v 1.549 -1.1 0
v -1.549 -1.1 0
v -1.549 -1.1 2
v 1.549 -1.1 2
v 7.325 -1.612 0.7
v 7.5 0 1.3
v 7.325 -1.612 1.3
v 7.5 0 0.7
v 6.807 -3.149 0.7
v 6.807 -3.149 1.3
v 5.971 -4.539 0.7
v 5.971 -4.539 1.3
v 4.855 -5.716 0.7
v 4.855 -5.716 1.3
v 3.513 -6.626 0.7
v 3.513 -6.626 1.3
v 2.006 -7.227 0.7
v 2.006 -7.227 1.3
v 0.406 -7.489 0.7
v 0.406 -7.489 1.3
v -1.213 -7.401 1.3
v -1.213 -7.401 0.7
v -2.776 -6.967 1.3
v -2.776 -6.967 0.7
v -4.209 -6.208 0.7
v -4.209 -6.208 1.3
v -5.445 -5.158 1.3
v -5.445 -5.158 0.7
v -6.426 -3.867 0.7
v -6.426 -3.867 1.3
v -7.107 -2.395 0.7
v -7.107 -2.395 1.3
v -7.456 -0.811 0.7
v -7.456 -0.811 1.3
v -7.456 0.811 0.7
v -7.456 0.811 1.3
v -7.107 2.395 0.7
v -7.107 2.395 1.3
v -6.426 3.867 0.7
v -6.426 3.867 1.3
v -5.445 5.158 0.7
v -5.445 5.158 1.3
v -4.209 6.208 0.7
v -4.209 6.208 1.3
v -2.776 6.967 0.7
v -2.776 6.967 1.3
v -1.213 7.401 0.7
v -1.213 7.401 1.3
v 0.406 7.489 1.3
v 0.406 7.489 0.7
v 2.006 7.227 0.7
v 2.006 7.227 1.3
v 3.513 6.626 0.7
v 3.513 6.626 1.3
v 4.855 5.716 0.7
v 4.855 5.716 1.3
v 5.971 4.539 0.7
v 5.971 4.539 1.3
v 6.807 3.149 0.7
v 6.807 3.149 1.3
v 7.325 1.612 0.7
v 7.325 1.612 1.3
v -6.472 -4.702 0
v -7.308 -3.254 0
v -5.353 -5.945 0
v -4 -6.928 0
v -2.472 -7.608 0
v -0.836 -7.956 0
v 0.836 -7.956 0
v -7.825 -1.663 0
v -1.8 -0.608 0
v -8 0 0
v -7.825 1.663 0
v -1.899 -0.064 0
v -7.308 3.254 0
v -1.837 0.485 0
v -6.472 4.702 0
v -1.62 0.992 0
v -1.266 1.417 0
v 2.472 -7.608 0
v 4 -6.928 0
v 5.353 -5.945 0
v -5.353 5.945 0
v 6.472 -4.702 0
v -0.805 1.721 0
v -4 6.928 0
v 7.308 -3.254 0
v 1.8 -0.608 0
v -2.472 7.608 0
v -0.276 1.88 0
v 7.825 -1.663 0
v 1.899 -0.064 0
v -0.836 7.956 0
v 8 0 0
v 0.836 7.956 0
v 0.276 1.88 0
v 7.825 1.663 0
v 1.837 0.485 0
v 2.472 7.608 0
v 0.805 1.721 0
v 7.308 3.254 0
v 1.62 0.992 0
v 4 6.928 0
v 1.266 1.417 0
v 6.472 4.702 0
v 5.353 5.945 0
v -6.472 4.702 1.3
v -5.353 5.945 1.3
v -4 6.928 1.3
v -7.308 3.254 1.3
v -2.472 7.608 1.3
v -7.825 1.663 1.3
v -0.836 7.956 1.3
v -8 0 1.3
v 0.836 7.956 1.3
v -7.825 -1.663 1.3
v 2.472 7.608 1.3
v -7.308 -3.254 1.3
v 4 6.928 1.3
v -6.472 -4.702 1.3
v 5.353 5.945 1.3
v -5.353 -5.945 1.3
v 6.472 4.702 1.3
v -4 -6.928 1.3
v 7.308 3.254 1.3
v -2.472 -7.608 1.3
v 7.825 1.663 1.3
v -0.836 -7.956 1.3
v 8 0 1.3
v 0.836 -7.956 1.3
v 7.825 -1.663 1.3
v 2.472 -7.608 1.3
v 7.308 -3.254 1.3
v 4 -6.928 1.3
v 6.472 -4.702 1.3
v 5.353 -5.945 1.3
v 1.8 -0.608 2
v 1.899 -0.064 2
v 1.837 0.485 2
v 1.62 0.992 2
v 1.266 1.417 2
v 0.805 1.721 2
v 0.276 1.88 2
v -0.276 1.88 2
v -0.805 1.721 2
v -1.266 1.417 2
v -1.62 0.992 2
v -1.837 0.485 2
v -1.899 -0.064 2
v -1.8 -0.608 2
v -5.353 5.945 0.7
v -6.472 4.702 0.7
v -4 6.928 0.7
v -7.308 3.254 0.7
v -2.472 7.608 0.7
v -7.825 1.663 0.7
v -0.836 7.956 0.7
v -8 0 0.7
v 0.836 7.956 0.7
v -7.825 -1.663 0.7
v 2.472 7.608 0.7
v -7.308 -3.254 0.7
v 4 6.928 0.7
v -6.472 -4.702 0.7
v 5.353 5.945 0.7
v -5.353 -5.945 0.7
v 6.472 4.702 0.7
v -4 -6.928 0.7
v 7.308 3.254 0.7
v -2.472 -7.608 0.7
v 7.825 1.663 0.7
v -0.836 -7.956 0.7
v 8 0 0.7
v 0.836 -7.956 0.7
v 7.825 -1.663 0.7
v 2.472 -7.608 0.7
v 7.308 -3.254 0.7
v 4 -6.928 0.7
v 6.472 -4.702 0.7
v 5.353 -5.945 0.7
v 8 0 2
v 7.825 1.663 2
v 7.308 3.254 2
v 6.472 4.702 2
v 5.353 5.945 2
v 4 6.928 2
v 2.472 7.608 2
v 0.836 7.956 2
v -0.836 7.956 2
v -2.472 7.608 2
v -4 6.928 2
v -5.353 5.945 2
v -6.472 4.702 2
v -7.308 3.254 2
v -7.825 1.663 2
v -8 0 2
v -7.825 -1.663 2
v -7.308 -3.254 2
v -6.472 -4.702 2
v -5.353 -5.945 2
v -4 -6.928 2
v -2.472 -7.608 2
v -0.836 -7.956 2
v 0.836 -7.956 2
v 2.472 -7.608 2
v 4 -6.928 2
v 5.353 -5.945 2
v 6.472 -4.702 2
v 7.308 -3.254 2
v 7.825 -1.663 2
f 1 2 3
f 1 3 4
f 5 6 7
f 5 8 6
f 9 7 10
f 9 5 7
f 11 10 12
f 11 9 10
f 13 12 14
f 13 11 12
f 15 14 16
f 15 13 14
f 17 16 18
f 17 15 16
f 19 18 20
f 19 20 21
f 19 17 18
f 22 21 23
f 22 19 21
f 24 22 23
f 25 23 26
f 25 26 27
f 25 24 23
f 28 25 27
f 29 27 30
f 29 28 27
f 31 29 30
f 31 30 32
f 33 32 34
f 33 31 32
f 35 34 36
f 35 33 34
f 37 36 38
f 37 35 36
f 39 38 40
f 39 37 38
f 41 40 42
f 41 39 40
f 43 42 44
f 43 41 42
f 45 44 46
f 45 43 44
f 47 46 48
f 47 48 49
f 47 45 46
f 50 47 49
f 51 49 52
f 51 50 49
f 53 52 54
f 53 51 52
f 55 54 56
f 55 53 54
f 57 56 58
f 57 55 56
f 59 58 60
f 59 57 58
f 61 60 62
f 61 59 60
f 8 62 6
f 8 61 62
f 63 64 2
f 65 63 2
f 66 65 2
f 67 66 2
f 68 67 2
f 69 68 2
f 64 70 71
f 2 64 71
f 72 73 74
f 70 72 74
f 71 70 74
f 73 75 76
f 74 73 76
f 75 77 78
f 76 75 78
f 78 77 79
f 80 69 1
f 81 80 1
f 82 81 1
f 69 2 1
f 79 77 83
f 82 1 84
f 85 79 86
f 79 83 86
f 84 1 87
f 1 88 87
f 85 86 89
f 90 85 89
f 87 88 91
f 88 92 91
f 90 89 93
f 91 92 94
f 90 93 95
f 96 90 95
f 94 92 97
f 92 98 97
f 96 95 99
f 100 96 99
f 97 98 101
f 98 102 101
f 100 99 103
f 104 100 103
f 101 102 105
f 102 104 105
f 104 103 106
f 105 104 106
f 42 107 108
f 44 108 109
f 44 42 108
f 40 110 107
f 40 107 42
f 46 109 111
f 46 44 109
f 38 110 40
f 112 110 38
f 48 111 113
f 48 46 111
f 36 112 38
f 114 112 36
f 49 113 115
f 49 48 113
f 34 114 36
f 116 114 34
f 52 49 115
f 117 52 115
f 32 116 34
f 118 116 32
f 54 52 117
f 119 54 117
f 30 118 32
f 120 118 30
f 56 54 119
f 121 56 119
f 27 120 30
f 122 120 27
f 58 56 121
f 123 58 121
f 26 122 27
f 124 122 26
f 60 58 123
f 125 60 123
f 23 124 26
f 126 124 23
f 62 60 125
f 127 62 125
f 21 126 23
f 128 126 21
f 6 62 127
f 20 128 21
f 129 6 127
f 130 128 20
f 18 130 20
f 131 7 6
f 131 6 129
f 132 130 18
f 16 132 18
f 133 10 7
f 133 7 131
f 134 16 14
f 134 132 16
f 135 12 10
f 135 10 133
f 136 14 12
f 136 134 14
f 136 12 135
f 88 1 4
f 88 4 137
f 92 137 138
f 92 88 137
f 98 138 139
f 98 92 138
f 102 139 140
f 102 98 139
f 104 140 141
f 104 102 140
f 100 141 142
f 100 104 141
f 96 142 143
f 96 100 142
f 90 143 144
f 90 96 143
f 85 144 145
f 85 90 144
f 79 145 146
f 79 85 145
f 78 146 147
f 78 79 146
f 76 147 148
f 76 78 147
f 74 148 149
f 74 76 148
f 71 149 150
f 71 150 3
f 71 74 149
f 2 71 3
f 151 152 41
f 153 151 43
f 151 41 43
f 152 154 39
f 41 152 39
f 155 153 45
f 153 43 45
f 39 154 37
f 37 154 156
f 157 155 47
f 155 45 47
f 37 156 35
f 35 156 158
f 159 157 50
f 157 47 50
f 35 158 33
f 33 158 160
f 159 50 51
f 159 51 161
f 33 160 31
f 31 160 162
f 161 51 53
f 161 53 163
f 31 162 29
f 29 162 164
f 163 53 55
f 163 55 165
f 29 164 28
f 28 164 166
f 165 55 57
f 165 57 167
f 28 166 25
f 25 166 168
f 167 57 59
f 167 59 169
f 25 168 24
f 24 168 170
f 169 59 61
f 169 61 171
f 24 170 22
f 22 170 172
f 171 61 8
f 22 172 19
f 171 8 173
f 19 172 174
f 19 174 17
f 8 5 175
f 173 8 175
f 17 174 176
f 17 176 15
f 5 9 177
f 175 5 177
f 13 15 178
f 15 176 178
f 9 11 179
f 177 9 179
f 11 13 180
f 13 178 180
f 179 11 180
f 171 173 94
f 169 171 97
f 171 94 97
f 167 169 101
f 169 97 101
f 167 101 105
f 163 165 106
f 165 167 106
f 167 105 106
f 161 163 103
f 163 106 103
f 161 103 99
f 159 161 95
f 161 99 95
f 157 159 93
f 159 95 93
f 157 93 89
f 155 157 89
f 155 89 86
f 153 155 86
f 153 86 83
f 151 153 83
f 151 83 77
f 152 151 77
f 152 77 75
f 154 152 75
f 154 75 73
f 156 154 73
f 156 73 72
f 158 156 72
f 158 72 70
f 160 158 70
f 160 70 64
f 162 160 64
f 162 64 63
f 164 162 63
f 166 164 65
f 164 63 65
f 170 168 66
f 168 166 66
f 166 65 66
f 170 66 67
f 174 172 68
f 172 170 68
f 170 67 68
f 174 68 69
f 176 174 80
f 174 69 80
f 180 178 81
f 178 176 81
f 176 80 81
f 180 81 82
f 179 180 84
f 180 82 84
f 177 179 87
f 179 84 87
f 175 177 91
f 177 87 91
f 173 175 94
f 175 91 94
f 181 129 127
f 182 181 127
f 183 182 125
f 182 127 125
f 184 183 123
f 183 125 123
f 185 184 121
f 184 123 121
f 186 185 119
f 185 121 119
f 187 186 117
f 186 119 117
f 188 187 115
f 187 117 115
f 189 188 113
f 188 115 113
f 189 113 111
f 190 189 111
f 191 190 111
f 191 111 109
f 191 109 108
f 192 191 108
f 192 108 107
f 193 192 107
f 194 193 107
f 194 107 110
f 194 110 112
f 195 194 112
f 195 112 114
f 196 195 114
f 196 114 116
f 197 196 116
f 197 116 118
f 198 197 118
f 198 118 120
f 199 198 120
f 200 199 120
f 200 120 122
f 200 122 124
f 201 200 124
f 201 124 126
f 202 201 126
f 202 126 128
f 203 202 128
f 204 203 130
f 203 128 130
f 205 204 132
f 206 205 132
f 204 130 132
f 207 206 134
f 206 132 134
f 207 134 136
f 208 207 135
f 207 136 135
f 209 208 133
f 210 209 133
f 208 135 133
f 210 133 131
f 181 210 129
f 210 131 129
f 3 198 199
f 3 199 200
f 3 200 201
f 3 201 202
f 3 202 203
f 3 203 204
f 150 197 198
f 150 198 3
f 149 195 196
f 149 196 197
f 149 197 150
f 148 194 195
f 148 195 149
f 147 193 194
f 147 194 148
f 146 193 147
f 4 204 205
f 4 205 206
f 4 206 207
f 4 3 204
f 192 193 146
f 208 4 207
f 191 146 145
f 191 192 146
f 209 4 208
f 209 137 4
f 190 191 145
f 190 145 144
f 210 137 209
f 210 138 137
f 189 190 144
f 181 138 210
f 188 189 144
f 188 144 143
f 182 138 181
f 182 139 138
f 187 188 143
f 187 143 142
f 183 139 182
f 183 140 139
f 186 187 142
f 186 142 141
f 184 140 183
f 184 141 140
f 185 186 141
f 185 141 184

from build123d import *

# Parameters (mm, degrees)
SKETCH1_R           = 8
BOSS_EXTRUDE2_DEPTH = 2
SKETCH2_W           = 0.5
SKETCH2_H           = 0.6


with BuildPart() as part:
    # Sketch1 → Boss-Extrude2 (new body)
    with BuildSketch(Plane.XY):
        Circle(SKETCH1_R)
        with BuildLine():
            Line((-1.549193338, -1.1), (1.549193338, -1.1))
            ThreePointArc((1.549193338, -1.1), (0, 1.9), (-1.549193338, -1.1))
        make_face(mode=Mode.SUBTRACT)
    extrude(amount=BOSS_EXTRUDE2_DEPTH)

    # Sketch2 → Cut-Revolve1 (revolve, cut)
    with BuildSketch(Plane(origin=(0, 0, 0), x_dir=(1, 0, 0), z_dir=(0, 1, 0)), mode=Mode.PRIVATE) as cut_revolve1_sk:
        with Locations((-7.75, -1)):
            Rectangle(SKETCH2_W, SKETCH2_H)
    revolve(cut_revolve1_sk.sketch.rotate(Axis((0, 0, 2), (0, 0, -1)), 180), axis=Axis((0, 0, 2), (0, 0, -1)), mode=Mode.SUBTRACT)


solid = part.part
